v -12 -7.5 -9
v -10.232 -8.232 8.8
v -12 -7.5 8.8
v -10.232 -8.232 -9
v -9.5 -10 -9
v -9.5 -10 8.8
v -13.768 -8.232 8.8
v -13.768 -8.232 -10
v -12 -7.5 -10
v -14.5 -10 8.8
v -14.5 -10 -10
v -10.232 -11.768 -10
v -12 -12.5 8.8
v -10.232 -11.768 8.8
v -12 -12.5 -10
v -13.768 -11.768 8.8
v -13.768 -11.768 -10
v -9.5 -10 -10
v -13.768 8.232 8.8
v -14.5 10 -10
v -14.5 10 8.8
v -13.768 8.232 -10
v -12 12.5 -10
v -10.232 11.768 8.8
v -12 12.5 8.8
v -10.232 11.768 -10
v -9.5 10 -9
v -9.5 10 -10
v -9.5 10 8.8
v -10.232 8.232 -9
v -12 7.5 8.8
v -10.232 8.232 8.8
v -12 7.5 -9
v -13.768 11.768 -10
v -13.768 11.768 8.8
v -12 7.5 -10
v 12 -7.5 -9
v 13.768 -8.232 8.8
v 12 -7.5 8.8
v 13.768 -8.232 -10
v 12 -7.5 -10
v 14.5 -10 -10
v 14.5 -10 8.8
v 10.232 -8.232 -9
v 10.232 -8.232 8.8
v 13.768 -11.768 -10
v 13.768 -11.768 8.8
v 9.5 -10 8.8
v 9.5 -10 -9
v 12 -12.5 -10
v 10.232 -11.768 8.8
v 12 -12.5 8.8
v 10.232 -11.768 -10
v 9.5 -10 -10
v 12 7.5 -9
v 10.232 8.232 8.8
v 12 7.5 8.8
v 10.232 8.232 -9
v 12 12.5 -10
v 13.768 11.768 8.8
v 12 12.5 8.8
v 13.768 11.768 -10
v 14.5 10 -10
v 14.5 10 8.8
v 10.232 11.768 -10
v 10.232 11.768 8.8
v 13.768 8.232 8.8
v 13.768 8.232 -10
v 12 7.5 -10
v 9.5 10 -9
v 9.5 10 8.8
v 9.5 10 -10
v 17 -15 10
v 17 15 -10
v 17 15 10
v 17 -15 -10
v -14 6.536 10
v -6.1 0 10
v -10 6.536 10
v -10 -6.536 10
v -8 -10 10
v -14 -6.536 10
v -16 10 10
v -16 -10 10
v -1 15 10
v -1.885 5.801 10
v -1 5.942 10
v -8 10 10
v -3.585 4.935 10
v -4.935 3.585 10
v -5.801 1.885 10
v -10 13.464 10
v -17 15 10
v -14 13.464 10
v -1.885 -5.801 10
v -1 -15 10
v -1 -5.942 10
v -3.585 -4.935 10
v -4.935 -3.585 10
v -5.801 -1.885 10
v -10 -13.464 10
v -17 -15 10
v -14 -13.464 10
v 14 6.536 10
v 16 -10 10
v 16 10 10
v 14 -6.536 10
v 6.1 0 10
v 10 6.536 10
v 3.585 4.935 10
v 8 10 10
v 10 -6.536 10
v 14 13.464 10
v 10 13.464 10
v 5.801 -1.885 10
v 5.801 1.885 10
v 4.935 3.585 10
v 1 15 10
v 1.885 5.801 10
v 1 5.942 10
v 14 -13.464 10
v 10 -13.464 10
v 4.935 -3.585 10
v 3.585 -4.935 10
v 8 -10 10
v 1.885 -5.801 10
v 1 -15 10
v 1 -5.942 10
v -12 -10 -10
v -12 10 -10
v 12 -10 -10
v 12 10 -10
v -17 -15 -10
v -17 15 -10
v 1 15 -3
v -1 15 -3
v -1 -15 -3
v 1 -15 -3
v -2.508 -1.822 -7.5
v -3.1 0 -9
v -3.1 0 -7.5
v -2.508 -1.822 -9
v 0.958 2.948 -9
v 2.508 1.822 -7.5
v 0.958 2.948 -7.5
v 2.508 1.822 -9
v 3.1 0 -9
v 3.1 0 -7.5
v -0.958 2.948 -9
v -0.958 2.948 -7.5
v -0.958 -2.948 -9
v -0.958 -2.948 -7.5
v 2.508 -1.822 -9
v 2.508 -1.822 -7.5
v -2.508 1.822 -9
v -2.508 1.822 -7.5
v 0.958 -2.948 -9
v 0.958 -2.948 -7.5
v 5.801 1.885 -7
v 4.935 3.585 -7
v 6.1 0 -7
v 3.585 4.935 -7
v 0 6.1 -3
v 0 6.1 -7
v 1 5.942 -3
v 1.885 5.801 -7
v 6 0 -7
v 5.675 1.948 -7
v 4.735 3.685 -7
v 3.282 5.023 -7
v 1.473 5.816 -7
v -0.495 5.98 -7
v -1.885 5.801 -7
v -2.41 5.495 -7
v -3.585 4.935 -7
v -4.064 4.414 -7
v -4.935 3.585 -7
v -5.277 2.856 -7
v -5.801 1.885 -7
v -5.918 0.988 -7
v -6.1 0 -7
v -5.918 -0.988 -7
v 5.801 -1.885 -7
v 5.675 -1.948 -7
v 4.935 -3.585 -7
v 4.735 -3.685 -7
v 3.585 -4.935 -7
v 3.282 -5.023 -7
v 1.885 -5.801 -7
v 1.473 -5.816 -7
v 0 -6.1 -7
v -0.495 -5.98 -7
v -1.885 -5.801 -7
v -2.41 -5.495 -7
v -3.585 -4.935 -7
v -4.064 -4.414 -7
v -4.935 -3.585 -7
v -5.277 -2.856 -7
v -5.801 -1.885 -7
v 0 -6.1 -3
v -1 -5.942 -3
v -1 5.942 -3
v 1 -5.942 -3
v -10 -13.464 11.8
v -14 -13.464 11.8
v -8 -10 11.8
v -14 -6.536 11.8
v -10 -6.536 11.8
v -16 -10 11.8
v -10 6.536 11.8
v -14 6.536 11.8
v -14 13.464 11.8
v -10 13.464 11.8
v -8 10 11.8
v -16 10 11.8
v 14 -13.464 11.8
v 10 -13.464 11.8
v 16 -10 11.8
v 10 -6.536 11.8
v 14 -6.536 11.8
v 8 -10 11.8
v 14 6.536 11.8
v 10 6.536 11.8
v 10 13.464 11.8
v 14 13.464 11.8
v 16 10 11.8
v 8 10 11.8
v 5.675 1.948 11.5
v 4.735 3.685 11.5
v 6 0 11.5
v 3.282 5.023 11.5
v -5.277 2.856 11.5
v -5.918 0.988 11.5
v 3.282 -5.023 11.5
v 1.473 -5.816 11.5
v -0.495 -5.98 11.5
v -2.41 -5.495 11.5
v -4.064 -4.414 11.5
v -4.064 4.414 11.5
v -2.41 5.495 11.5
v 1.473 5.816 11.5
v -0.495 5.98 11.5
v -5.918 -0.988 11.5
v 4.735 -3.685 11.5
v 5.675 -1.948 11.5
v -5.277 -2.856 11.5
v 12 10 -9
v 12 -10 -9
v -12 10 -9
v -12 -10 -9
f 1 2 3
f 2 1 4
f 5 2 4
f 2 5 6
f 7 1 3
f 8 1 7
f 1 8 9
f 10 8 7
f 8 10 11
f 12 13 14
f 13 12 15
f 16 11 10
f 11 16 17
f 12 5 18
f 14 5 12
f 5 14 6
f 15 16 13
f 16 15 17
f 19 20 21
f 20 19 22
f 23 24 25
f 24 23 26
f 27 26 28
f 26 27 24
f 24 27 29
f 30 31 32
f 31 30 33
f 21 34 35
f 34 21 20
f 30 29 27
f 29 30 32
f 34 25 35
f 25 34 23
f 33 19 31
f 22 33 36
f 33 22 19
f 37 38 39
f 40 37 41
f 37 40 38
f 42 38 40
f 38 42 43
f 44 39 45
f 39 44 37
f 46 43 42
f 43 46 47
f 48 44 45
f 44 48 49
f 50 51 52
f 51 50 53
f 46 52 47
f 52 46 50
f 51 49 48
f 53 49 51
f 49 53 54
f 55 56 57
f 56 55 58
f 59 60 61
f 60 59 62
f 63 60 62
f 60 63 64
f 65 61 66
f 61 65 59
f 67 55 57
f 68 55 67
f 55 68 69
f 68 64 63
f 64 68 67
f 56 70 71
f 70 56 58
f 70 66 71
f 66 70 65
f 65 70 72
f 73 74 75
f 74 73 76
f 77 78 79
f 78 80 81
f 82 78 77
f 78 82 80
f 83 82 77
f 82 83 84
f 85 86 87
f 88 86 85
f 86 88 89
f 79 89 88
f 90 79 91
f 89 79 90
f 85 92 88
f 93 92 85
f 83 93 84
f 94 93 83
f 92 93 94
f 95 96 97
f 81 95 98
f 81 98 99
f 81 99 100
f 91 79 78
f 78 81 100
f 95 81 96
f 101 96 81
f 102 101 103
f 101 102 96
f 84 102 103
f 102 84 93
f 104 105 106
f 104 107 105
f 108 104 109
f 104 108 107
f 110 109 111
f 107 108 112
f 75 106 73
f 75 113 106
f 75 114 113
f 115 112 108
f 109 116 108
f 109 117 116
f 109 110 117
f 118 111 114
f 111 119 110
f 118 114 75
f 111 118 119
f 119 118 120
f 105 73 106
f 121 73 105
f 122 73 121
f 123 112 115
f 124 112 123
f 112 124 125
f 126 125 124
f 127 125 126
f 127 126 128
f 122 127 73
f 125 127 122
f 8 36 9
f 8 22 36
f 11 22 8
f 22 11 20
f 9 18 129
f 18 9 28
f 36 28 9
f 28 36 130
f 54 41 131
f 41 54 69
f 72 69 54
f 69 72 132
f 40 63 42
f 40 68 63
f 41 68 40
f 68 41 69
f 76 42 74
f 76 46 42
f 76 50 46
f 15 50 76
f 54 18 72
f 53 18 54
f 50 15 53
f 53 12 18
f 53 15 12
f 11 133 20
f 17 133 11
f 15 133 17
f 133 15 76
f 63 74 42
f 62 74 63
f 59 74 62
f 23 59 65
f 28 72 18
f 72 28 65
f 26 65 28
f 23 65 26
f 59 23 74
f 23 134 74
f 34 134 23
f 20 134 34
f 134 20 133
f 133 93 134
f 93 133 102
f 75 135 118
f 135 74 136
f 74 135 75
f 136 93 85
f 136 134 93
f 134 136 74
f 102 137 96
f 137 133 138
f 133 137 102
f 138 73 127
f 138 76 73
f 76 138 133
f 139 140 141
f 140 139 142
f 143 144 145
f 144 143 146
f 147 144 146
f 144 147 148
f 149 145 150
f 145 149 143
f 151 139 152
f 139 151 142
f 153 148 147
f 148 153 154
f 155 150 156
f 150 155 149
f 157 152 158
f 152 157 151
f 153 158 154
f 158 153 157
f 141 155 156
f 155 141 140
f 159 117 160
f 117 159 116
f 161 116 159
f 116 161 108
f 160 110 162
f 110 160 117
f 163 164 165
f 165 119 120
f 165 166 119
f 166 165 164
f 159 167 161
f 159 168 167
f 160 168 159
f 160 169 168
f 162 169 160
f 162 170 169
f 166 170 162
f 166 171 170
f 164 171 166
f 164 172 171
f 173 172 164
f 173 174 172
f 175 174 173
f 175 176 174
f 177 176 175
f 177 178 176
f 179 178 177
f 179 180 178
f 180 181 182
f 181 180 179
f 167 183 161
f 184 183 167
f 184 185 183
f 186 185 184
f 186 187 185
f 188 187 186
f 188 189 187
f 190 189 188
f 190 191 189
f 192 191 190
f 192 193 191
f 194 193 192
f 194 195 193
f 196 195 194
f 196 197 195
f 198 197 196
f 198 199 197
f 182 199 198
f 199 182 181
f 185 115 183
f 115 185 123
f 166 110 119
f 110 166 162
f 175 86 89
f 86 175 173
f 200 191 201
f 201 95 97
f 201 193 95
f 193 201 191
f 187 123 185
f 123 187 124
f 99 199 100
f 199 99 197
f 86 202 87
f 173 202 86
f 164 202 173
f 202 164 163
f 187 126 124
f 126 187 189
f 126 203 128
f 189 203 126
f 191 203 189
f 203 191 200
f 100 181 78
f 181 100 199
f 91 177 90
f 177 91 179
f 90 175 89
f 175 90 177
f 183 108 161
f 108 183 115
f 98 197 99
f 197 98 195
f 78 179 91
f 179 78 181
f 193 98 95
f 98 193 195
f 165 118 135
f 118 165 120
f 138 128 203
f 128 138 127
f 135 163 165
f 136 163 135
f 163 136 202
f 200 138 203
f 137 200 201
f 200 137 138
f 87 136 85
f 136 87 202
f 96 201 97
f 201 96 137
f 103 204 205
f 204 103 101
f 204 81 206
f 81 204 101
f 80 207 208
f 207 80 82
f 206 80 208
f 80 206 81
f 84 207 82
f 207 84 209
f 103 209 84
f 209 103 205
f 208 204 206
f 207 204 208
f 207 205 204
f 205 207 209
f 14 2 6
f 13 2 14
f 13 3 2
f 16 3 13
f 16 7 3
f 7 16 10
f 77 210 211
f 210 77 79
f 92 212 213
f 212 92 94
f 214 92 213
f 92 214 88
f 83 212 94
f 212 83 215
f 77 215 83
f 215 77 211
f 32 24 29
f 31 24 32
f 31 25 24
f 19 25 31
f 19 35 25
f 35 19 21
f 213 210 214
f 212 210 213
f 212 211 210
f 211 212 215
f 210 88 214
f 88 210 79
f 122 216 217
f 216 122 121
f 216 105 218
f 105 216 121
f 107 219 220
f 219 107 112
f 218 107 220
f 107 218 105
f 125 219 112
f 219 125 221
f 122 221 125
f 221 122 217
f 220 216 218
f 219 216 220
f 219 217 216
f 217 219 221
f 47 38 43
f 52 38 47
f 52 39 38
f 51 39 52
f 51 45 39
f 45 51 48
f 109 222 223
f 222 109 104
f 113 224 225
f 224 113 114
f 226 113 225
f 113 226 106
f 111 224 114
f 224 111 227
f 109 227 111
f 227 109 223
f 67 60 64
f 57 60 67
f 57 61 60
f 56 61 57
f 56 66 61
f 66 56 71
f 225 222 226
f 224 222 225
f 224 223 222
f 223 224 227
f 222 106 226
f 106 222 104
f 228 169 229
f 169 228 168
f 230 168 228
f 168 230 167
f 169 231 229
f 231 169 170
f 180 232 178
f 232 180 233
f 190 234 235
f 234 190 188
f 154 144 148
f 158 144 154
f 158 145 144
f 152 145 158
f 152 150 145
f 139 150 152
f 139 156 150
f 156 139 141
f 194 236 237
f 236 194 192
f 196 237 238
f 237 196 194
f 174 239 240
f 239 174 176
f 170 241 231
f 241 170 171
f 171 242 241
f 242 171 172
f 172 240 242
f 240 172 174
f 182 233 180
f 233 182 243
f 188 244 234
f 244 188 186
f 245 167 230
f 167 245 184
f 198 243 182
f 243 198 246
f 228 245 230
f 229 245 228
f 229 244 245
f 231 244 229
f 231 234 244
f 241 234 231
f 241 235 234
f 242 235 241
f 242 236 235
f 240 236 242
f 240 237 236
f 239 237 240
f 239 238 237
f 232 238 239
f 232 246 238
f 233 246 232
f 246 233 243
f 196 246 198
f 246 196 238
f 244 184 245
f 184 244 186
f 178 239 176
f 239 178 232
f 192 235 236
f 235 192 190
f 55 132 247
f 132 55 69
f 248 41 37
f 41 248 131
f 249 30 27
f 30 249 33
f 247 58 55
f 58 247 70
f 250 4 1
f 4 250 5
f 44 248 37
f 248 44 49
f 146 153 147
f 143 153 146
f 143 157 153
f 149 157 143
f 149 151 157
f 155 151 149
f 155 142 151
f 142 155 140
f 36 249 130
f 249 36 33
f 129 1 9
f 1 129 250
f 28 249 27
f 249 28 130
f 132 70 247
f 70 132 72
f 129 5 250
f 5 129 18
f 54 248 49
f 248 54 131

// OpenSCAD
// Parameters
shaft_diameter_mm = 6.0; //[3.0:12.0:0.1]
block_length_mm = 34.0; //[17.0:68.0:0.5]
block_width_mm = 30.0; //[15.0:60.0:0.5]
block_height_mm = 20.0; //[10.0:40.0:0.5]
bearing_outer_diameter_mm = 12.0; //[8.0:24.0:0.1]
bearing_length_mm = 19.0; //[10.0:38.0:0.1]
bore_diameter_mm = 6.0; //[3.0:12.0:0.1]
bore_clearance_mm = 0.2; //[0.0:0.6:0.05]
mounting_hole_diameter_mm = 5.0; //[3.0:8.0:0.1]
mounting_hole_spacing_x_mm = 24.0; //[12.0:48.0:0.5]
mounting_hole_spacing_y_mm = 20.0; //[10.0:40.0:0.5]
clamp_slot_width_mm = 2.0; //[1.0:4.0:0.1]
clamp_slot_depth_mm = 12.0; //[6.0:18.0:0.5]
clamp_screw_clearance_diameter_mm = 3.4; //[2.4:6.0:0.1]
clamp_boss_diameter_mm = 10.0; //[6.0:18.0:0.5]
clamp_boss_height_mm = 6.0; //[3.0:12.0:0.5]
bearing_seat_clearance_mm = 0.2; //[0.0:0.6:0.05]
bearing_seat_depth_mm = 16.0; //[8.0:30.0:0.5]
edge_margin_mm = 4.0; //[2.0:8.0:0.5]
overlap_mm = 1.0; //[0.5:2.0:0.1]

// --- Added: corner fastener/bolt heads (fused to body with overlap) ---
bolt_head_d_mm = 8.0;          // visual head diameter
bolt_head_h_mm = 3.0;          // visual head height
bolt_head_overlap_mm = 1.2;    // 1-2mm overlap into the block to guarantee fusion
bolt_head_fn = 6;              // hex-like

module corner_bolt_heads() {
  // Place heads centered over the mounting hole pattern.
  // Ensure they intersect the top face by (bolt_head_overlap_mm).
  zc = block_height_mm/2 + bolt_head_h_mm/2 - bolt_head_overlap_mm;

  for (x = [-mounting_hole_spacing_x_mm/2, mounting_hole_spacing_x_mm/2])
    for (y = [-mounting_hole_spacing_y_mm/2, mounting_hole_spacing_y_mm/2])
      translate([x, y, zc])
        cylinder(d=bolt_head_d_mm, h=bolt_head_h_mm, center=true, $fn=bolt_head_fn);
}

// SCS8UU Bearing Block (body only)
module scs_bearing_block_body() {
  difference() {
    // Main block
    cube([block_length_mm, block_width_mm, block_height_mm], center=true);

    // Shaft bore
    cylinder(r=(bore_diameter_mm + bore_clearance_mm)/2,
             h=block_height_mm + 2*overlap_mm, center=true);

    // Bearing seat
    translate([0, 0, block_height_mm/2 - (bearing_seat_depth_mm + overlap_mm)/2])
      cylinder(r=(bearing_outer_diameter_mm + bearing_seat_clearance_mm)/2,
               h=bearing_seat_depth_mm + overlap_mm, center=true);

    // Mounting holes
    for (x = [-mounting_hole_spacing_x_mm/2, mounting_hole_spacing_x_mm/2])
      for (y = [-mounting_hole_spacing_y_mm/2, mounting_hole_spacing_y_mm/2])
        translate([x, y, 0])
          cylinder(r=mounting_hole_diameter_mm/2,
                   h=block_height_mm + 2*overlap_mm, center=true);

    // Split clamp slot
    translate([0, 0, block_height_mm/2 - (clamp_slot_depth_mm + overlap_mm)/2])
      cube([clamp_slot_width_mm, block_width_mm + 2*overlap_mm,
            clamp_slot_depth_mm + overlap_mm], center=true);
  }
}

// Linear Bearing (kept as-is; assembly unions it with the block)
module linear_bearing() {
  color([0.0, 0.4, 0.2]) {
    translate([0, 0, block_height_mm/2 - bearing_seat_depth_mm/2])
      cylinder(r=bearing_outer_diameter_mm/2, h=bearing_length_mm, center=true);
  }
}

// SCS Bearing Block (body + fused bolt heads)
module scs_bearing_block() {
  color([0.85, 0.85, 0.8]) {
    union() {
      scs_bearing_block_body();
      corner_bolt_heads(); // FIX: physically attached via overlap into top face
    }
  }
}

// SBR Bearing Block (kept, but also gets fused bolt heads for structural integrity if used)
module sbr_bearing_block() {
  color([0.85, 0.85, 0.8]) {
    union() {
      difference() {
        // Main block
        cube([block_length_mm, block_width_mm, block_height_mm], center=true);

        // Shaft bore
        cylinder(r=(bore_diameter_mm + bore_clearance_mm)/2,
                 h=block_height_mm + 2*overlap_mm, center=true);

        // Bearing seat
        translate([0, 0, block_height_mm/2 - (bearing_seat_depth_mm + overlap_mm)/2])
          cylinder(r=(bearing_outer_diameter_mm + bearing_seat_clearance_mm)/2,
                   h=bearing_seat_depth_mm + overlap_mm, center=true);

        // Mounting holes
        for (x = [-mounting_hole_spacing_x_mm/2, mounting_hole_spacing_x_mm/2])
          for (y = [-mounting_hole_spacing_y_mm/2, mounting_hole_spacing_y_mm/2])
            translate([x, y, 0])
              cylinder(r=mounting_hole_diameter_mm/2,
                       h=block_height_mm + 2*overlap_mm, center=true);

        // Split clamp slot
        translate([0, 0, block_height_mm/2 - (clamp_slot_depth_mm + overlap_mm)/2])
          cube([clamp_slot_width_mm, block_width_mm + 2*overlap_mm,
                clamp_slot_depth_mm + overlap_mm], center=true);
      }
      corner_bolt_heads(); // FIX: ensure no floating fasteners if this block is used
    }
  }
}

// SCS Bearing Block Assembly (single connected solid)
module scs_bearing_block_assembly() {
  union() {
    scs_bearing_block();
    linear_bearing();
  }
}

// SCS Bearing Block Hole Positions (visual aid)
module scs_bearing_block_hole_positions() {
  color([0.1, 0.1, 0.6]) {
    translate([0, 0, -block_height_mm/2 + overlap_mm/2])
      cube([mounting_hole_spacing_x_mm, mounting_hole_spacing_y_mm, overlap_mm], center=true);
  }
}

// SBR Bearing Block Hole Positions (visual aid)
module sbr_bearing_block_hole_positions() {
  color([0.1, 0.1, 0.6]) {
    translate([0, 0, -block_height_mm/2 + overlap_mm/2])
      cube([mounting_hole_spacing_x_mm, mounting_hole_spacing_y_mm, overlap_mm], center=true);
  }
}

// Assembly
module assembly() {
  scs_bearing_block_assembly();
  scs_bearing_block_hole_positions();
  sbr_bearing_block_hole_positions();
}

assembly();
